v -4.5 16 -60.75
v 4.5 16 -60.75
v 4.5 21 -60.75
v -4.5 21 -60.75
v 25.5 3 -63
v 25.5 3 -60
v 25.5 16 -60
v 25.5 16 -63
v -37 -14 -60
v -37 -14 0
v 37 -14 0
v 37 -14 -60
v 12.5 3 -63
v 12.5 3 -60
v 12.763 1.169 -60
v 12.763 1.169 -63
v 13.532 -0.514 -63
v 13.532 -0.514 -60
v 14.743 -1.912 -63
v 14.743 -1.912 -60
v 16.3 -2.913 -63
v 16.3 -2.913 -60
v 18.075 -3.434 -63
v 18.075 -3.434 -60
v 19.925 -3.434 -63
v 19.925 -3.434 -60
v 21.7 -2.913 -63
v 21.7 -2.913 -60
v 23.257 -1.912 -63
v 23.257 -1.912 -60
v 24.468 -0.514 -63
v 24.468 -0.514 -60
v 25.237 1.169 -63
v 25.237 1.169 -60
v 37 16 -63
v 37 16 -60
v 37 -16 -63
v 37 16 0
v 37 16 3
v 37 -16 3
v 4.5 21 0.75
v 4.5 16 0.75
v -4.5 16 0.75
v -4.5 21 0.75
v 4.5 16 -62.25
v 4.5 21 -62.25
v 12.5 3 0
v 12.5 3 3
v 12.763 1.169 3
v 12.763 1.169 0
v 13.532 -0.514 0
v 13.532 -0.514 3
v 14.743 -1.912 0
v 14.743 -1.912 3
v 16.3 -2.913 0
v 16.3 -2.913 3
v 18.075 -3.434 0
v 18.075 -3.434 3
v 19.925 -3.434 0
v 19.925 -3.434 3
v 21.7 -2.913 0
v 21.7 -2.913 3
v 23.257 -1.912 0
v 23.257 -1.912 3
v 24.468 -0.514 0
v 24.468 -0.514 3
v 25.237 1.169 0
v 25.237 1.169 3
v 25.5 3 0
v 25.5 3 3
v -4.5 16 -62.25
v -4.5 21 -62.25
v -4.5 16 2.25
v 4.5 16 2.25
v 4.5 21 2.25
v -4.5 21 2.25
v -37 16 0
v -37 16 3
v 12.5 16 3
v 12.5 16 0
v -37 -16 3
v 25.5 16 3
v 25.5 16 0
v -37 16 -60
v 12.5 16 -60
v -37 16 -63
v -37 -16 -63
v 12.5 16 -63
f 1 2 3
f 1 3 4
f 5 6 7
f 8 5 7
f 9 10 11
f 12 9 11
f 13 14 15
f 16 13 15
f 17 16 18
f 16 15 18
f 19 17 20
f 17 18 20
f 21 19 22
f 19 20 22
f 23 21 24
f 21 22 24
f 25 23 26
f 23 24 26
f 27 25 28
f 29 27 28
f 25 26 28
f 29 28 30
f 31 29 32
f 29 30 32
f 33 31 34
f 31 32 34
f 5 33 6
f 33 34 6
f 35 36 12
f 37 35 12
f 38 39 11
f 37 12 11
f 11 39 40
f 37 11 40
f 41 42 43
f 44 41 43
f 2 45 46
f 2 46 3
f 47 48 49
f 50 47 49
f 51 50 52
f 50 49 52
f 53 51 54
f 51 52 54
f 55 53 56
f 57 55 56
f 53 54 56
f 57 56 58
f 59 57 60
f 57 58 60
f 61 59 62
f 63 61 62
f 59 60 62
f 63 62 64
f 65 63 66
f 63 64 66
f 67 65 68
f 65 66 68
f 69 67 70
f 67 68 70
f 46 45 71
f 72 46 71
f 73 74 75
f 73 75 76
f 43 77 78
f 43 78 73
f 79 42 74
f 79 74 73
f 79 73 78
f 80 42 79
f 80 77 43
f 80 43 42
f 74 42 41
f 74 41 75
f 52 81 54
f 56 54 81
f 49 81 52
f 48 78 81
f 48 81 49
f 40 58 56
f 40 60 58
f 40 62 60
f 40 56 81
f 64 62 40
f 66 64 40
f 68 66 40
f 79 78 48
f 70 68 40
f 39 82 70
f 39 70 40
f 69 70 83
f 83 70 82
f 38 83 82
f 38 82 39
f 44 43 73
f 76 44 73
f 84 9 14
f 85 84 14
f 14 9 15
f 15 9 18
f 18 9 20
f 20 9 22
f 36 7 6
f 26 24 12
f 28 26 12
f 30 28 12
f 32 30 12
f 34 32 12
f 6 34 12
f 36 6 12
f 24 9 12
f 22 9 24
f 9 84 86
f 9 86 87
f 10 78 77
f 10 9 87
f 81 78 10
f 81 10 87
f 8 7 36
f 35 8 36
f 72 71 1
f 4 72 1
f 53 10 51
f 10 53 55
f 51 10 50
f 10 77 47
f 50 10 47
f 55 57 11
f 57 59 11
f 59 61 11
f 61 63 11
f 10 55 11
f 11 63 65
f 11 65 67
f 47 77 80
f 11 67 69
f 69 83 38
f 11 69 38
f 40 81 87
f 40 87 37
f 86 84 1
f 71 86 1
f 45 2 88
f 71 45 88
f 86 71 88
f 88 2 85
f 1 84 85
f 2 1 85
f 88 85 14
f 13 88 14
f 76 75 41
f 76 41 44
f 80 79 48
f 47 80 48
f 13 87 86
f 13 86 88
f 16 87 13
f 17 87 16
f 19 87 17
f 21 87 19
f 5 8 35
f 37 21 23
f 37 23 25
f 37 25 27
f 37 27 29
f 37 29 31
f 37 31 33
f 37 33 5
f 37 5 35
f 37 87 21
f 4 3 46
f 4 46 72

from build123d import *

# Parameters (mm, degrees)
F0_W      = 74
F0_H      = 32
F1_DEPTH  = 3
F2_W      = 74
F2_H      = 2
F3_DEPTH  = 60
F4_W      = 74
F4_H      = 32
F5_DEPTH  = 3
F6_W      = 9
F6_H      = 1.5
F7_DEPTH  = 5
F8_W      = 9
F8_H      = 1.5
F9_DEPTH  = 5
F11_DEPTH = 66


with BuildPart() as f1:
    # F0 (on Top) → F1 (new body)
    with BuildSketch(Plane.XY):
        Rectangle(F0_W, F0_H)
    extrude(amount=F1_DEPTH)

    # F2 (on face) → F3 (join)
    with BuildSketch(Plane(origin=(0, 0, 0), x_dir=(1, 0, 0), z_dir=(0, 0, -1))):
        with Locations((0, 15)):
            Rectangle(F2_W, F2_H)
    extrude(amount=F3_DEPTH)

    # F4 (on face) → F5 (join)
    with BuildSketch(Plane(origin=(0, 0, -60), x_dir=(1, 0, 0), z_dir=(0, 0, -1))):
        Rectangle(F4_W, F4_H)
    extrude(amount=F5_DEPTH)

    # F6 (on face) → F7 (join)
    with BuildSketch(Plane(origin=(0, 16, 0), x_dir=(-1, 0, 0), z_dir=(0, 1, 0))):
        with Locations((0, 1.5)):
            Rectangle(F6_W, F6_H)
    extrude(amount=F7_DEPTH)

    # F8 (on face) → F9 (join)
    with BuildSketch(Plane(origin=(0, 16, 0), x_dir=(-1, 0, 0), z_dir=(0, 1, 0))):
        with Locations((0, -61.5)):
            Rectangle(F8_W, F8_H)
    extrude(amount=F9_DEPTH)

    # F10 (on face) → F11 (cut, through all)
    with BuildSketch(Plane.XY.offset(3)):
        with BuildLine():
            Line((12.5, 16), (12.5, 3))
            ThreePointArc((12.5, 3), (19, -3.5), (25.5, 3))
            Line((25.5, 3), (25.5, 16))
            Line((25.5, 16), (12.5, 16))
        make_face()
    extrude(amount=-F11_DEPTH, mode=Mode.SUBTRACT)


solid = f1.part
